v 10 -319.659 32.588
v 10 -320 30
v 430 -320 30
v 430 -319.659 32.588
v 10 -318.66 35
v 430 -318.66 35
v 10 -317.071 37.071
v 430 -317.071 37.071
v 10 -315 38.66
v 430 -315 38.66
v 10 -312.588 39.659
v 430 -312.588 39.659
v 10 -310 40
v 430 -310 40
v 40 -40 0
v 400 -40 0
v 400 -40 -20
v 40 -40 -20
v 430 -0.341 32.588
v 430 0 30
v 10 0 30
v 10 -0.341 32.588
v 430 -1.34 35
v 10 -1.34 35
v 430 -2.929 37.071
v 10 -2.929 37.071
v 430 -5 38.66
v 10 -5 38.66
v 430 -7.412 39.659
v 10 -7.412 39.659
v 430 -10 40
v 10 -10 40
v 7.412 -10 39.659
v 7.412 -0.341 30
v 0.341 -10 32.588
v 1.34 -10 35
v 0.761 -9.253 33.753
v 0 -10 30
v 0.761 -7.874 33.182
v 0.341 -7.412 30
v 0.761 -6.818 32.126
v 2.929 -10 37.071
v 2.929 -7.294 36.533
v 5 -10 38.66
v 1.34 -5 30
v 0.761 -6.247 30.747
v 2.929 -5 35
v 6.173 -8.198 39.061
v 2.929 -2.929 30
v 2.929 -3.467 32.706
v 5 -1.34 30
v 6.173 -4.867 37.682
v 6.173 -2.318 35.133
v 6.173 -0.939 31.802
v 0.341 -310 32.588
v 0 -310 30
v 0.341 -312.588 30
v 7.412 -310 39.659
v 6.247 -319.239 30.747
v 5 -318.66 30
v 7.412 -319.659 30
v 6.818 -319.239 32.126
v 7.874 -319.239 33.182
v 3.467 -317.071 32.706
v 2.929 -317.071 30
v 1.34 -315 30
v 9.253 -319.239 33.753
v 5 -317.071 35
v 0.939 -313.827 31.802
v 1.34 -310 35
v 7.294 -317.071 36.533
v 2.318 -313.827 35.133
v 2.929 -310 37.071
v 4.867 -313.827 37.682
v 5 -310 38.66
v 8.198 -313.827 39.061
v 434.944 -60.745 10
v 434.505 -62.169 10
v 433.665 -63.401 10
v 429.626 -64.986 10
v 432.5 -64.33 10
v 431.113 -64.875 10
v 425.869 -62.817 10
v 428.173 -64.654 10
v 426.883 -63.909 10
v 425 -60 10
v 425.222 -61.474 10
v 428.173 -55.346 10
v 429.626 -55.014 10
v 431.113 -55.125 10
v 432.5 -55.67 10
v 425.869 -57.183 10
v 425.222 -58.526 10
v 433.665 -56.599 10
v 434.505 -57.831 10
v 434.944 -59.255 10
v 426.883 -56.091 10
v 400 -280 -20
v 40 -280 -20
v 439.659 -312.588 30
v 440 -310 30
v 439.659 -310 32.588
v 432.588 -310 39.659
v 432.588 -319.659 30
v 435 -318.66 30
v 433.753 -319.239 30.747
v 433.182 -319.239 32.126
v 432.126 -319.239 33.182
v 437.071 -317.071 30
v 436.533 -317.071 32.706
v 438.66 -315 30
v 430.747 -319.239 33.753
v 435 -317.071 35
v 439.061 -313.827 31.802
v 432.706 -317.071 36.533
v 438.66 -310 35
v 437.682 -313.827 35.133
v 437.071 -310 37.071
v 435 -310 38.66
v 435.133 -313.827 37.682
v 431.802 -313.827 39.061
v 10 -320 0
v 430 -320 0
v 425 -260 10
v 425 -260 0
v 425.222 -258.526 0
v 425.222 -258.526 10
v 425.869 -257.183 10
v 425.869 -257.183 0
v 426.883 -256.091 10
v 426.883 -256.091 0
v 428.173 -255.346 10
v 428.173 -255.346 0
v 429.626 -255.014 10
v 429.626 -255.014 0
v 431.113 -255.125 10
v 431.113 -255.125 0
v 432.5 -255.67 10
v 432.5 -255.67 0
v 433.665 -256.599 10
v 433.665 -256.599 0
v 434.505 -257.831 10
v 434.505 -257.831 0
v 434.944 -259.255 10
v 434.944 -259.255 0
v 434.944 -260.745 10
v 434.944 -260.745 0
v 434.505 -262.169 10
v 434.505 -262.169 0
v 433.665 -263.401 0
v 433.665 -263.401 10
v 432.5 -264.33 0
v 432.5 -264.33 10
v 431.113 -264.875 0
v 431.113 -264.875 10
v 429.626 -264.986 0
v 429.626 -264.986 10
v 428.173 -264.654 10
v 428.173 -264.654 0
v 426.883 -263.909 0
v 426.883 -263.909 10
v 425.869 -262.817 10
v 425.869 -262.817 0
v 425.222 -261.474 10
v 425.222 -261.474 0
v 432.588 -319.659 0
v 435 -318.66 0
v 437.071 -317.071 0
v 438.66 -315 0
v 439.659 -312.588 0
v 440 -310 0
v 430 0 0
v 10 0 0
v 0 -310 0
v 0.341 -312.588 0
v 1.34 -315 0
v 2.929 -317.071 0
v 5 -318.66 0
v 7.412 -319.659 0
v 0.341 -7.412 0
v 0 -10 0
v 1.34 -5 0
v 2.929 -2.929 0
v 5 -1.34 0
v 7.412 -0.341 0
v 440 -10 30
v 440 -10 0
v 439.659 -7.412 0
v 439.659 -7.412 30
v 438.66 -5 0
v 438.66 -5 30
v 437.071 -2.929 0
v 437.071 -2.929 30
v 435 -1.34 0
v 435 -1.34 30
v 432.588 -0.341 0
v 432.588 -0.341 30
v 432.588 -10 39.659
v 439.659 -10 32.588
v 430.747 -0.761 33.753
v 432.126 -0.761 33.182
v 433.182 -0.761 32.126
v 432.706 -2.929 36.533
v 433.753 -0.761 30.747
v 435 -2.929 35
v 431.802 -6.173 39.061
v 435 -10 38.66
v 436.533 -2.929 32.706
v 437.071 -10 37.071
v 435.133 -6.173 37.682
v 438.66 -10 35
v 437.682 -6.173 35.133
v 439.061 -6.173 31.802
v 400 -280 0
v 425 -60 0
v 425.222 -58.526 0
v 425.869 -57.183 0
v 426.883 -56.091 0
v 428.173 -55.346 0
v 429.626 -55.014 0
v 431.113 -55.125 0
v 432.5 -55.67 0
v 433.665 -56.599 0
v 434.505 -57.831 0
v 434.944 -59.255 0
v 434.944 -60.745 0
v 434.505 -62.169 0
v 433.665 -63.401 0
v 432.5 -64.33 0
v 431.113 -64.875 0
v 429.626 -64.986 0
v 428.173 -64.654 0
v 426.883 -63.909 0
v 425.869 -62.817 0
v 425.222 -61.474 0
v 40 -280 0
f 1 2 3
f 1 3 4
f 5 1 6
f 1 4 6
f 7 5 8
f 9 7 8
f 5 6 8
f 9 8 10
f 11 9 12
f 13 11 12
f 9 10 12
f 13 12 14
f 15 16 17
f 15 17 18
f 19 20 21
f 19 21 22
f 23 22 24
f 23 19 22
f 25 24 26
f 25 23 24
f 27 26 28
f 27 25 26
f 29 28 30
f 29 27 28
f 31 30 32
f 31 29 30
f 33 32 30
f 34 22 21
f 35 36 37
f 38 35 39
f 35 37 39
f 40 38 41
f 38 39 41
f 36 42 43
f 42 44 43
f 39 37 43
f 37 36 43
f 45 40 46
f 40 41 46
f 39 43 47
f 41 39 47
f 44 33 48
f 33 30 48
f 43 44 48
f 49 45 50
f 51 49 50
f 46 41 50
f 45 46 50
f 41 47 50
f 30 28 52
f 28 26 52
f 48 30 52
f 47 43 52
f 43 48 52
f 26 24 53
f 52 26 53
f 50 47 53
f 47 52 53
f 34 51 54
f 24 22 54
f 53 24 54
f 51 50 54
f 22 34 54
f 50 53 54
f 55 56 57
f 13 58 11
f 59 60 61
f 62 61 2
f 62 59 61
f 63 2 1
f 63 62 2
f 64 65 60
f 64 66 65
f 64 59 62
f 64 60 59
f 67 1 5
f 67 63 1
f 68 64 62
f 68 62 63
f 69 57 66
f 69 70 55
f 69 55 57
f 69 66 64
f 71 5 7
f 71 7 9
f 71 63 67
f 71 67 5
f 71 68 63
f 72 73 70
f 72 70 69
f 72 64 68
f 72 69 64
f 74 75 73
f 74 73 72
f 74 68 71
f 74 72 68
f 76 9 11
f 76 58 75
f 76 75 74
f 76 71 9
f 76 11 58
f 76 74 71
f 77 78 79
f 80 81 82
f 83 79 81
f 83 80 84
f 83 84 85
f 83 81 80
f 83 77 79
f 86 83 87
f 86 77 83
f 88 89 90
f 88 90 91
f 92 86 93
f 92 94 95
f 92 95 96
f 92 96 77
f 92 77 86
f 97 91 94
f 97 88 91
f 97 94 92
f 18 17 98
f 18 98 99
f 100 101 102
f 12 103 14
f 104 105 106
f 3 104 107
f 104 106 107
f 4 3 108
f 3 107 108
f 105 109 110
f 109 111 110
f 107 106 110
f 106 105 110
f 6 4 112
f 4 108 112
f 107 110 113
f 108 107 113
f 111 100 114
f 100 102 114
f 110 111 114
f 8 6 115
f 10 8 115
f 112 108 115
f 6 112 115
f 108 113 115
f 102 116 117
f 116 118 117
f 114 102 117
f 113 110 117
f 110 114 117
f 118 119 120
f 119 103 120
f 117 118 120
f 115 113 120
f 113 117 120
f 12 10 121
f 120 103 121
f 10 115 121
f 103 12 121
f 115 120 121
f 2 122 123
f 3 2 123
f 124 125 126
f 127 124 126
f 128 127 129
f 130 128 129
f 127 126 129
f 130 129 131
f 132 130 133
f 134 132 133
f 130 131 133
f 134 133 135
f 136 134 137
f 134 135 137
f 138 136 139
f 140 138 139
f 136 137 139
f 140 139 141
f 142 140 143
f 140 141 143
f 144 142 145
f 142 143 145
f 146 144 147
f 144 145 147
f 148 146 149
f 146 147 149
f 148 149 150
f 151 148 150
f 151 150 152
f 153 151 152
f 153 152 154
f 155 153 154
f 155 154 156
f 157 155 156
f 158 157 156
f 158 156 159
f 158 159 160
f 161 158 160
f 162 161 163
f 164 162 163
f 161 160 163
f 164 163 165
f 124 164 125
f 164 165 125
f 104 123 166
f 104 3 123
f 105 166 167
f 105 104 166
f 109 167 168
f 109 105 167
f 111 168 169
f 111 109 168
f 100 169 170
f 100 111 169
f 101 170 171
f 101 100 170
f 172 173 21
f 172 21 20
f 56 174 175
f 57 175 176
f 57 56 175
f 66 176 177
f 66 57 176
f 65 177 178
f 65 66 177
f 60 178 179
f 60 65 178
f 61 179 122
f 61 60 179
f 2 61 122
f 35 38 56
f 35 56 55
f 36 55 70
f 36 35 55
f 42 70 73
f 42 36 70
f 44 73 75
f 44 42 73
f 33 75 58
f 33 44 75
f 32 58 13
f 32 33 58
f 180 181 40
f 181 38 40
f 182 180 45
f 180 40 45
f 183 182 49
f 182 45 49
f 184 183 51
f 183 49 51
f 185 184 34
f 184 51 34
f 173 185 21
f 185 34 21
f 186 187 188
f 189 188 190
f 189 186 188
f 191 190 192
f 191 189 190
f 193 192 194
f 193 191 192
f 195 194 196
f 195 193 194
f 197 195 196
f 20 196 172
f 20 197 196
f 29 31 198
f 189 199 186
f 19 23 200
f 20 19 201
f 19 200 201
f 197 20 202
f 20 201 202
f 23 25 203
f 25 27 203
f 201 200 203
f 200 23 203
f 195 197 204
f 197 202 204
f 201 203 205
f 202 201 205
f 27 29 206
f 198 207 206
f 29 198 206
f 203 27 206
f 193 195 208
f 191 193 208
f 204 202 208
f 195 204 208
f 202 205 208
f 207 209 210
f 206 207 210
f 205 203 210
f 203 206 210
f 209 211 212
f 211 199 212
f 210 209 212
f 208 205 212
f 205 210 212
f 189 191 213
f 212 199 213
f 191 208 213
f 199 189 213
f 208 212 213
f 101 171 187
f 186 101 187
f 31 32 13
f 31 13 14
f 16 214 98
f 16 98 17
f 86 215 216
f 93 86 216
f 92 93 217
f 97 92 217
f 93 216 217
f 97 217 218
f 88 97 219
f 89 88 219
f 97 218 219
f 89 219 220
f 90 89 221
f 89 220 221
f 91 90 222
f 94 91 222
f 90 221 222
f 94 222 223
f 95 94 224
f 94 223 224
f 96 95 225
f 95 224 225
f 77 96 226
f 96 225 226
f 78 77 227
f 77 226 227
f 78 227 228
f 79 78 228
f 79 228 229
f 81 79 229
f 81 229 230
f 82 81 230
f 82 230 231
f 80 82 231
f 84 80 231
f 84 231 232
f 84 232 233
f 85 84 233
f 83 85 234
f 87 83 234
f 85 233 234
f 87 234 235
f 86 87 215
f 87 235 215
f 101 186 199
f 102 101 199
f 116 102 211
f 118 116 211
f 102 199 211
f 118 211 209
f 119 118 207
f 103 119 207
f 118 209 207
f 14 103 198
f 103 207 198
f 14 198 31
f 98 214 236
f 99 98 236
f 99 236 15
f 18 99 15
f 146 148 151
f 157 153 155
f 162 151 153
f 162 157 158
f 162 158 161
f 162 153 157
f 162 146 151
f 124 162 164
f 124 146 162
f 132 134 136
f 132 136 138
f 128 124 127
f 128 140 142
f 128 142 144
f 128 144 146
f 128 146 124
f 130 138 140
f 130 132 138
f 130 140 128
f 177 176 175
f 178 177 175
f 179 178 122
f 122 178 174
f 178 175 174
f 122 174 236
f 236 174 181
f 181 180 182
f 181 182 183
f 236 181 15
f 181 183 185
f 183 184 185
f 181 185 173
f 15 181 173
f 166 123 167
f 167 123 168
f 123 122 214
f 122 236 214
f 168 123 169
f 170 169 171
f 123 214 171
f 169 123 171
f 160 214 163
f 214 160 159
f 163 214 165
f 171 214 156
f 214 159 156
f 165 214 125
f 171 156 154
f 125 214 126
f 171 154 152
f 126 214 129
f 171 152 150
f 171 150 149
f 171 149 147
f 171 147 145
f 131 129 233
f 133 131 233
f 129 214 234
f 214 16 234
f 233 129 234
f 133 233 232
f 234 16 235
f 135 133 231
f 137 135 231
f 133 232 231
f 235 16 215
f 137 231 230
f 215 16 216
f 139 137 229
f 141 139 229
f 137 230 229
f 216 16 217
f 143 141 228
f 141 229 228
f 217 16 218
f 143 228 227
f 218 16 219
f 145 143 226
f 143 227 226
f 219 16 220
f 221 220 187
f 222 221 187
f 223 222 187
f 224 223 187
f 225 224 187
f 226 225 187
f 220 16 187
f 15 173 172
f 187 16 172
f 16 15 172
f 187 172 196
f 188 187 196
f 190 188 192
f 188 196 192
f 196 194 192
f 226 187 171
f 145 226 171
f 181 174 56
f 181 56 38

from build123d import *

# Parameters (mm, degrees)
SKETCH_1_W          = 440
SKETCH_1_H          = 320
EXTRUDE_1_DEPTH     = 40
FILLET_1_R          = 10
SKETCH_3_W          = 360
SKETCH_3_H          = 240
EXTRUDE_2_DEPTH     = 20
SKETCH_4_R          = 5
CUT_EXTRUDE_1_DEPTH = 10


with BuildPart() as part:
    # 草图1 → 凸台-拉伸1 (new body)
    with BuildSketch(Plane.XY):
        with Locations((220, -160)):
            Rectangle(SKETCH_1_W, SKETCH_1_H)
    extrude(amount=EXTRUDE_1_DEPTH)

    # 圆角1
    fillet_1_edges = [part.edges().sort_by_distance(p)[0] for p in [
        (440, -160, 40),
        (220, 0, 40),
        (0, -160, 40),
        (0, 0, 20),
        (440, 0, 20),
        (440, -320, 20),
        (0, -320, 20),
        (220, -320, 40),
    ]]
    fillet(fillet_1_edges, radius=FILLET_1_R)

    # 草图3 → 凸台-拉伸2 (add)
    with BuildSketch(Plane(origin=(0, 0, 0), x_dir=(-1, 0, 0), z_dir=(0, 0, -1))):
        with Locations((-220, -160)):
            Rectangle(SKETCH_3_W, SKETCH_3_H)
    extrude(amount=EXTRUDE_2_DEPTH)

    # 草图4 → 切除-拉伸1 (cut)
    with BuildSketch(Plane(origin=(0, 0, 0), x_dir=(-1, 0, 0), z_dir=(0, 0, -1))):
        with Locations((-430, -60)):
            Circle(SKETCH_4_R)
        with Locations((-430, -260)):
            Circle(SKETCH_4_R)
    extrude(amount=-CUT_EXTRUDE_1_DEPTH, mode=Mode.SUBTRACT)


solid = part.part
